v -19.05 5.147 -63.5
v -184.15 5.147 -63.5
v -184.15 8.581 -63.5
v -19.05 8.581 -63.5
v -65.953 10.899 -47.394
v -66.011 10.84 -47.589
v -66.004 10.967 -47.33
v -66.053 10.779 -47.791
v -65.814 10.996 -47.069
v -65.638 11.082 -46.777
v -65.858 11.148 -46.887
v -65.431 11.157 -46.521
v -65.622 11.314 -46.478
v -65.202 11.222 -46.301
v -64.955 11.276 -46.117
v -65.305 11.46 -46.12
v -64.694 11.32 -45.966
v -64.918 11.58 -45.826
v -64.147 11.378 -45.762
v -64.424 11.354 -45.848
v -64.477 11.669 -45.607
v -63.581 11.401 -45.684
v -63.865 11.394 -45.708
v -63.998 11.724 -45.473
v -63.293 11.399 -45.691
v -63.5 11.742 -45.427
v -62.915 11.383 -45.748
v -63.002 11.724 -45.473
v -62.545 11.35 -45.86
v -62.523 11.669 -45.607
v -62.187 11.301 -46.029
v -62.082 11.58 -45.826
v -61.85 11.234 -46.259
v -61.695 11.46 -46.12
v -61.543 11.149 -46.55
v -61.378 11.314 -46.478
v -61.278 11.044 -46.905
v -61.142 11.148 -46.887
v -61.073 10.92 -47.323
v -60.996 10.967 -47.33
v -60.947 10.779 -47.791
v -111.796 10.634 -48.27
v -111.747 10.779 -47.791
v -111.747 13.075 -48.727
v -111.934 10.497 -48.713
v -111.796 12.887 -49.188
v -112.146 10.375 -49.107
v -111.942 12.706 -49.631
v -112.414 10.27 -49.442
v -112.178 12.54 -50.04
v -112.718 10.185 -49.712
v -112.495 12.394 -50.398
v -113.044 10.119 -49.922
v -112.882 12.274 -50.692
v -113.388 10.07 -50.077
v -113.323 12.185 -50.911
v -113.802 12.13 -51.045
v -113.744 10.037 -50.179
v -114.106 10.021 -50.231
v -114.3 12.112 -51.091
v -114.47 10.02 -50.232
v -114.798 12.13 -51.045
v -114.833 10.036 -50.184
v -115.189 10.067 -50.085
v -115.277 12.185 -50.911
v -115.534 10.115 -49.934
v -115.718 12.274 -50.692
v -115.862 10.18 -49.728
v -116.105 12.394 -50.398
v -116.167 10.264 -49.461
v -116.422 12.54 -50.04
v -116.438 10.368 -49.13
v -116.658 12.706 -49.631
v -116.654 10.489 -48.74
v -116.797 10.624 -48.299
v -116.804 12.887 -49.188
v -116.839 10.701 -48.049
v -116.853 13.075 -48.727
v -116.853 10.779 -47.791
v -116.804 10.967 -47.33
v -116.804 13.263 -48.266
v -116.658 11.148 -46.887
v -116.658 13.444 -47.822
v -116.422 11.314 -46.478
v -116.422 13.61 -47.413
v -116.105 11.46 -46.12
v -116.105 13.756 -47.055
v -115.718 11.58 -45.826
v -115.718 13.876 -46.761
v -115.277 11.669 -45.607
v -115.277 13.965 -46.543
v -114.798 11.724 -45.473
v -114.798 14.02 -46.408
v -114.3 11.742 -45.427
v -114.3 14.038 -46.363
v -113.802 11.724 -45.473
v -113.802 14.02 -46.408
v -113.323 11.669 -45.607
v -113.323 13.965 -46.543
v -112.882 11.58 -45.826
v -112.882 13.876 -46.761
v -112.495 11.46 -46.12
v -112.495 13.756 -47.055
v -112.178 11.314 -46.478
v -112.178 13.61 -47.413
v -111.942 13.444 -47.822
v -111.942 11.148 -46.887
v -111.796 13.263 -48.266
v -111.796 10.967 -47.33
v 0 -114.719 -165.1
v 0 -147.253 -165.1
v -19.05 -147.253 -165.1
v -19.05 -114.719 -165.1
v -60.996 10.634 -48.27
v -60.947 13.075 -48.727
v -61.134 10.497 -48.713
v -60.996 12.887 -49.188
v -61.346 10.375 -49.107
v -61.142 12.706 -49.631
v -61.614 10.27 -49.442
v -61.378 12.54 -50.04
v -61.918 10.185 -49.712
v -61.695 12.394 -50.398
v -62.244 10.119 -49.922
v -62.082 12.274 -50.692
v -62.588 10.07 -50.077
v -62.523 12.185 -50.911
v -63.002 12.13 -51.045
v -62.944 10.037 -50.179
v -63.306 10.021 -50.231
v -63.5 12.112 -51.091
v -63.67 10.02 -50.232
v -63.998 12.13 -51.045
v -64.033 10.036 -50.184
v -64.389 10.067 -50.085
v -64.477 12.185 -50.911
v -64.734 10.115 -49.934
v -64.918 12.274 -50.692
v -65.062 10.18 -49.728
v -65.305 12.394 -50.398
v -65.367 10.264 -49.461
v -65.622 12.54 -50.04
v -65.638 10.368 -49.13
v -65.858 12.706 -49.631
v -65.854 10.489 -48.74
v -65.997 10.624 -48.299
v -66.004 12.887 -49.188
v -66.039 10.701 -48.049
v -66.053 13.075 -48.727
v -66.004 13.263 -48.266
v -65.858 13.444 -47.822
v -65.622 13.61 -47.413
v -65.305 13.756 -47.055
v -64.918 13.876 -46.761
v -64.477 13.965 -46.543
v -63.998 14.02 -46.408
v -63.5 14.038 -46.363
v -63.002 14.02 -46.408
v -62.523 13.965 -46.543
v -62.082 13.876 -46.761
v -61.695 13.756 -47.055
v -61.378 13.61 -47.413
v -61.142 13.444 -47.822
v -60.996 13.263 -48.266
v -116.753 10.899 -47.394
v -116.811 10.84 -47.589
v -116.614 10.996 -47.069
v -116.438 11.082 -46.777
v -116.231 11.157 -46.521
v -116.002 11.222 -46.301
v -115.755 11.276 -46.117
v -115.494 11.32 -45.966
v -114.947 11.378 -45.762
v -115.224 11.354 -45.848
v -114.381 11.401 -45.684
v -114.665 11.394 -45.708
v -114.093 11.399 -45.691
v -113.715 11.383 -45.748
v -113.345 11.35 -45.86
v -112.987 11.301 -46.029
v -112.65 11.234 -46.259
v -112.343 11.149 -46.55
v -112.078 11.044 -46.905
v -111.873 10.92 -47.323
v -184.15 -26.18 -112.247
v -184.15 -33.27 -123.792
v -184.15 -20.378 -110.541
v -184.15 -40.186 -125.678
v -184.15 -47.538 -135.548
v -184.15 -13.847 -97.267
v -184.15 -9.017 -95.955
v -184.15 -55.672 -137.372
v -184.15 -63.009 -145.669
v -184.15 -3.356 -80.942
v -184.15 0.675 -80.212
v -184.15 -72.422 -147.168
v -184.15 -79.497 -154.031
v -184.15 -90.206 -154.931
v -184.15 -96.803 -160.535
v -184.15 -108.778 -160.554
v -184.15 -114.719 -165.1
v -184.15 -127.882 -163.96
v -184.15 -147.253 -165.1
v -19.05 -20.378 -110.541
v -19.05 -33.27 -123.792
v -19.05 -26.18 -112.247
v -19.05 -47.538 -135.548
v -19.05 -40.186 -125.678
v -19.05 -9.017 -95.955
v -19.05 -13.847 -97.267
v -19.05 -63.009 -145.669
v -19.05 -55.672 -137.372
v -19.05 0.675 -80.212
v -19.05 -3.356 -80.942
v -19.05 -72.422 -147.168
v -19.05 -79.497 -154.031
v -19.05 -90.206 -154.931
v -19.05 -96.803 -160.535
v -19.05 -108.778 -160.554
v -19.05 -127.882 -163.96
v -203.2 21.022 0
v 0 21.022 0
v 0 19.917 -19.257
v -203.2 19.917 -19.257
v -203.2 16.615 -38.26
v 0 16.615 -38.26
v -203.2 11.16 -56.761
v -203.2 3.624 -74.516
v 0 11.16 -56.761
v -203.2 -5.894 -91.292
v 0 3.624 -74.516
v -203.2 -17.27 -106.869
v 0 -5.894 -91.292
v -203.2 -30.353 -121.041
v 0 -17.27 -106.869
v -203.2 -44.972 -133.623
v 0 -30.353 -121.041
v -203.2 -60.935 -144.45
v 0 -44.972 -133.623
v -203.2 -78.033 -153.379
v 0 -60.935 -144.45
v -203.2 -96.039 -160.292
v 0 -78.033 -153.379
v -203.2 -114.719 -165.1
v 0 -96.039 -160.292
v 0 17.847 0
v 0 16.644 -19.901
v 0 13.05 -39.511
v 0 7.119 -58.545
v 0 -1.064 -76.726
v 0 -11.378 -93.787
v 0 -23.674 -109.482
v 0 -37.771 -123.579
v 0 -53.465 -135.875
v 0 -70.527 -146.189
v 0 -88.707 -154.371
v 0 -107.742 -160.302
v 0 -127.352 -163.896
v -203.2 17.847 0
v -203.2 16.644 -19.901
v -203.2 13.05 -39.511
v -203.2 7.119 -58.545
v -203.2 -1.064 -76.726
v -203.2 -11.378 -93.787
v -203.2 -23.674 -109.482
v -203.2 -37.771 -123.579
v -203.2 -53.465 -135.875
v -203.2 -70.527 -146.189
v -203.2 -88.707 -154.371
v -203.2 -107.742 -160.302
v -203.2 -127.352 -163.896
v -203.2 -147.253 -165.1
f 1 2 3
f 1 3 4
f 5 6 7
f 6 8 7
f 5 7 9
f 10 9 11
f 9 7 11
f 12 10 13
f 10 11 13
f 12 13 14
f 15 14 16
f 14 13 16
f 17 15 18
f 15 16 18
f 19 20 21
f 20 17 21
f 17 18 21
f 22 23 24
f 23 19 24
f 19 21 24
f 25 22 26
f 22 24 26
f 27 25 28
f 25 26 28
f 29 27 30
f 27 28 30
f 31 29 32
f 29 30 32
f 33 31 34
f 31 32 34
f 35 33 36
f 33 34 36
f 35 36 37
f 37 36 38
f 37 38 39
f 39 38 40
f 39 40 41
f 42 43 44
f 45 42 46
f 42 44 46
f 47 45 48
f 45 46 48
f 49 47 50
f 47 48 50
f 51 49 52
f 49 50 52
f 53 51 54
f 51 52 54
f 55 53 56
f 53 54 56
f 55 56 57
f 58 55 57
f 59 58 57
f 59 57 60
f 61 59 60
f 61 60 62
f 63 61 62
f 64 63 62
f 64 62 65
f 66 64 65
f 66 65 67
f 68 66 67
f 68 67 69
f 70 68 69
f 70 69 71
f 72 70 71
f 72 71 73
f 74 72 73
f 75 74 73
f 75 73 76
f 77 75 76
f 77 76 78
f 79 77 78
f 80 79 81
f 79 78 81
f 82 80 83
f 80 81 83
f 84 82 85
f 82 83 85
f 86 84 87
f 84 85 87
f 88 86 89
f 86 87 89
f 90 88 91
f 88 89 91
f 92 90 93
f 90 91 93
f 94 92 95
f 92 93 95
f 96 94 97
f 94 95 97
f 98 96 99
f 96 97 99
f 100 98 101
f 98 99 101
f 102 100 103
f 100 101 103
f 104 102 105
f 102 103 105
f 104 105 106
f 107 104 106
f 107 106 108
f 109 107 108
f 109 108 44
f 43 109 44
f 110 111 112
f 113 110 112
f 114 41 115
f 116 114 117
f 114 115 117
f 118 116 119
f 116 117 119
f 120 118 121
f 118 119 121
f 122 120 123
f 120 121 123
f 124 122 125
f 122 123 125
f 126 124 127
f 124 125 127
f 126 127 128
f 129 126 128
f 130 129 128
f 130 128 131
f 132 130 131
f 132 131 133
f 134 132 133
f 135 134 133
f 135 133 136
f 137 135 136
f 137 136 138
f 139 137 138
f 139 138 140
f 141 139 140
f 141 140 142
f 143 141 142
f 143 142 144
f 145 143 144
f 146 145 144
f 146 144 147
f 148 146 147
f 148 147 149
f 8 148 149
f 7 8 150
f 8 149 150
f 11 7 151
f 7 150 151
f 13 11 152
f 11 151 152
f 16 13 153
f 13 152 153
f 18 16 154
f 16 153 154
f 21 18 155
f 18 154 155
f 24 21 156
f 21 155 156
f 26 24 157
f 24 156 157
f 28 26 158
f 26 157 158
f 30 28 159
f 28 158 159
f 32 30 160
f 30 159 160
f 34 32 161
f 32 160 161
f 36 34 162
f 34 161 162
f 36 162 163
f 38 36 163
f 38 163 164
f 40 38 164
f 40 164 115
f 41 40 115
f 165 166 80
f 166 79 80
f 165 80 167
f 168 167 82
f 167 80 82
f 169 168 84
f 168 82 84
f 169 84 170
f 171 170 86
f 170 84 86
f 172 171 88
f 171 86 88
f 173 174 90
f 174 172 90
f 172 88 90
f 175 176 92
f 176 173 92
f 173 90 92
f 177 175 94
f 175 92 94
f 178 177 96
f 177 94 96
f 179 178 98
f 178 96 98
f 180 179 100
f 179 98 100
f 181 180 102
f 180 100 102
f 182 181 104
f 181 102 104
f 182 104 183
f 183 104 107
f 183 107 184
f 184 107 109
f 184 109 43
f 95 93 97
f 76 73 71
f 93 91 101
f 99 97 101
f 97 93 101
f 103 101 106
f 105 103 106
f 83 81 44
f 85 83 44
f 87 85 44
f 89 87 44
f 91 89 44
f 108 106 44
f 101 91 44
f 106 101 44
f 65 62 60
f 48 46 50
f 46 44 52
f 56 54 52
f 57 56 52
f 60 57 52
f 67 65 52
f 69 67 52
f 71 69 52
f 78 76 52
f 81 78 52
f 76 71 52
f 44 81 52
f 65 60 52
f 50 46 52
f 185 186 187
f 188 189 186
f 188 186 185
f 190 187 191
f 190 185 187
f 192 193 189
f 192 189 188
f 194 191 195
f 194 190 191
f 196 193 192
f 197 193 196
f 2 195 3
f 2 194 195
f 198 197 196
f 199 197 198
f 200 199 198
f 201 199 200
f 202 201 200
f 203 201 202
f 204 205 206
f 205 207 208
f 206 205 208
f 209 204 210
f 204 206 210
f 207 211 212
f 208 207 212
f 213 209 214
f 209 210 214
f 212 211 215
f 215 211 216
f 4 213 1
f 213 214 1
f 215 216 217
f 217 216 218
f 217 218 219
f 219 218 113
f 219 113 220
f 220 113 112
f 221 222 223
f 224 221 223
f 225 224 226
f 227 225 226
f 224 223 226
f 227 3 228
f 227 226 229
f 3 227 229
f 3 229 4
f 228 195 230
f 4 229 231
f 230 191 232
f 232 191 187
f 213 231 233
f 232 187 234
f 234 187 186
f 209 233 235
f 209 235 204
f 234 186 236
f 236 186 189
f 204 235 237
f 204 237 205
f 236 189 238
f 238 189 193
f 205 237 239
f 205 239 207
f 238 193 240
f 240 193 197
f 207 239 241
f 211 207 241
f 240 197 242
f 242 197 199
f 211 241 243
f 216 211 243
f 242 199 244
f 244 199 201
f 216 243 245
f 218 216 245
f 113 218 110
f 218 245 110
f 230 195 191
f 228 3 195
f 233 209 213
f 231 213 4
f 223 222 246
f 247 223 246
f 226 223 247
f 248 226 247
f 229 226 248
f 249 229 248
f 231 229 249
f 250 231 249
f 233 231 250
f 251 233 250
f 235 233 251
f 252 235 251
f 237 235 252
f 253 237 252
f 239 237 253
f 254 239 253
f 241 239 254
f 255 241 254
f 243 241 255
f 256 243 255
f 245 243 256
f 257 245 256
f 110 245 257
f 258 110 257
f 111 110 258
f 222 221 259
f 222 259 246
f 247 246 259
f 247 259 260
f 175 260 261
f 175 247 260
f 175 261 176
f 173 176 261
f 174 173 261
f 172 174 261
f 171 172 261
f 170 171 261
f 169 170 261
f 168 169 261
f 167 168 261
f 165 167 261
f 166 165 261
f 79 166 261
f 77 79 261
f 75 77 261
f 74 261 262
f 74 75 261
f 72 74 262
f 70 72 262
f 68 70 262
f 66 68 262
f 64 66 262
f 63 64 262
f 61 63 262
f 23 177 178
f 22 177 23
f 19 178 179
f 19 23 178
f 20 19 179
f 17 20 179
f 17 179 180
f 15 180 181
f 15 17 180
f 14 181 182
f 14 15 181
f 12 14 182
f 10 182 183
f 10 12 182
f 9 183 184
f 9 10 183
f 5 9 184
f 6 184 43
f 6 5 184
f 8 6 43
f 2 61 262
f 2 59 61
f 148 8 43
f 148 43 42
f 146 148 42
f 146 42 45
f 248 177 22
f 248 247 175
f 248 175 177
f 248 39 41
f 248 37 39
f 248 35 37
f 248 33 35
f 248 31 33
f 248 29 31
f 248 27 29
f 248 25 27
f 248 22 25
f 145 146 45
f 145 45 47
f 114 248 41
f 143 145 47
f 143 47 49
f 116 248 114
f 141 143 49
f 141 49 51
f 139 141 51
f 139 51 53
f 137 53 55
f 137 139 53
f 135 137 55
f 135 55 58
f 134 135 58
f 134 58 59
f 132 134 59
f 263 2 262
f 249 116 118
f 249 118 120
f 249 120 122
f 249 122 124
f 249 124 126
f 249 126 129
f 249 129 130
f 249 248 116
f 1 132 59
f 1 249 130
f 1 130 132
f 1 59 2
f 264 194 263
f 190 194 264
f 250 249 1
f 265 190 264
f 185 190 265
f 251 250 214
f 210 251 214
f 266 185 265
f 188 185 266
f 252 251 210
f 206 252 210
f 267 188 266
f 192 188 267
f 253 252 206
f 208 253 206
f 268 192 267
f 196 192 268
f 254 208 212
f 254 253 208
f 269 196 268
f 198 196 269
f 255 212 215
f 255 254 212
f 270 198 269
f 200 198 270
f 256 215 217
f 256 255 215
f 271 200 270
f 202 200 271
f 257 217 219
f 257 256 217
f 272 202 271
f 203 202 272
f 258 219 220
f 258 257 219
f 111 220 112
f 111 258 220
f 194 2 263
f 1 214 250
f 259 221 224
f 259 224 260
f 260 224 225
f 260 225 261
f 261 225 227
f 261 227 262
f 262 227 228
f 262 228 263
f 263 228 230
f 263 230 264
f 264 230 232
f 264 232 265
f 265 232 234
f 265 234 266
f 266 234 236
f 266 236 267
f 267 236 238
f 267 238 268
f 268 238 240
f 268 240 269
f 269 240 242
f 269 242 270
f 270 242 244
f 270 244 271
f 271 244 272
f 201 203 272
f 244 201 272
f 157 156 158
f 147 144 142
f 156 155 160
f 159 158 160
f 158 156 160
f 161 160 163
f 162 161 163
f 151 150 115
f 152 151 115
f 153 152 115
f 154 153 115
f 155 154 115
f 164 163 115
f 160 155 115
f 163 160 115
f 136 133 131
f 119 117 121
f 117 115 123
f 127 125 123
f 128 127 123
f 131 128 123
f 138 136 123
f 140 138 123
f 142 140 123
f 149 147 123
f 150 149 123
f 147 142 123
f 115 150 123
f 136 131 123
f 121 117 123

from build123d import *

# Parameters (mm, degrees)
SKETCH1_W          = 203.2
SKETCH1_H          = 3.175
REVOLVE1_ANGLE     = 90
SKETCH2_W          = 203.2
SKETCH2_H          = 3.175
CUT_EXTRUDE1_DEPTH = 313.926814527
SKETCH3_W          = 165.1
SKETCH3_H          = 101.6
CUT_EXTRUDE2_DEPTH = 312.230984359


# Read off the part's stored shape, not the designer's step: #10 Clearance Hole1
with BuildPart() as part:
    # Sketch1 → Revolve1 (revolve)
    with BuildSketch(Plane.XY):
        with Locations((-101.6, 19.434848485)):
            Rectangle(SKETCH1_W, SKETCH1_H)
    revolve(axis=Axis((-168.467424242, -147.252651515, 0), (-1, 0, 0)), revolution_arc=REVOLVE1_ANGLE)

    # Sketch2 → Cut-Extrude1 (cut, through all)
    with BuildSketch(Plane(origin=(0, -147.252651515, 0), x_dir=(-1, 0, 0), z_dir=(0, -1, 0))):
        with Locations((101.6, 166.6875)):
            Rectangle(SKETCH2_W, SKETCH2_H)
    extrude(amount=-CUT_EXTRUDE1_DEPTH, mode=Mode.SUBTRACT)

    # Sketch3 → Cut-Extrude2 (cut, through all)
    with BuildSketch(Plane.XZ.offset(147.252651515)):
        with Locations((-101.6, -114.3)):
            Rectangle(SKETCH3_W, SKETCH3_H)
    extrude(amount=-CUT_EXTRUDE2_DEPTH, mode=Mode.SUBTRACT)

    # #10 Clearance Hole1 outline → #10 Clearance Hole1 (revolve, cut)
    with BuildSketch(Plane(origin=(-63.5, -15.166166065, -37.2189581), x_dir=(1, 0, 0), z_dir=(0, 0.3773584905660381, 0.9260672597590962))):
        Polygon((2.5527, 30.49567621), (0, 30.49567621), (0, 27.797130409), (2.187572038, 27.797130409), (2.5527, 28.016521422), align=None)
    revolve(axis=Axis((-63.5, -15.166166065, -37.2189581), (0, 0.9260672597590962, -0.3773584905660381)), mode=Mode.SUBTRACT)

    # 10 Clearance Hole1 2 outline → 10 Clearance Hole1 2 (revolve, cut)
    with BuildSketch(Plane(origin=(-114.3, -15.166166065, -37.2189581), x_dir=(1, 0, 0), z_dir=(0, 0.3773584905660381, 0.9260672597590962))):
        Polygon((0, 30.49567621), (0, 27.797130409), (2.187572038, 27.797130409), (2.5527, 28.016521422), (2.5527, 30.49567621), align=None)
    revolve(axis=Axis((-114.3, -15.166166065, -37.2189581), (0, 0.9260672597590962, -0.3773584905660381)), mode=Mode.SUBTRACT)


solid = part.part
